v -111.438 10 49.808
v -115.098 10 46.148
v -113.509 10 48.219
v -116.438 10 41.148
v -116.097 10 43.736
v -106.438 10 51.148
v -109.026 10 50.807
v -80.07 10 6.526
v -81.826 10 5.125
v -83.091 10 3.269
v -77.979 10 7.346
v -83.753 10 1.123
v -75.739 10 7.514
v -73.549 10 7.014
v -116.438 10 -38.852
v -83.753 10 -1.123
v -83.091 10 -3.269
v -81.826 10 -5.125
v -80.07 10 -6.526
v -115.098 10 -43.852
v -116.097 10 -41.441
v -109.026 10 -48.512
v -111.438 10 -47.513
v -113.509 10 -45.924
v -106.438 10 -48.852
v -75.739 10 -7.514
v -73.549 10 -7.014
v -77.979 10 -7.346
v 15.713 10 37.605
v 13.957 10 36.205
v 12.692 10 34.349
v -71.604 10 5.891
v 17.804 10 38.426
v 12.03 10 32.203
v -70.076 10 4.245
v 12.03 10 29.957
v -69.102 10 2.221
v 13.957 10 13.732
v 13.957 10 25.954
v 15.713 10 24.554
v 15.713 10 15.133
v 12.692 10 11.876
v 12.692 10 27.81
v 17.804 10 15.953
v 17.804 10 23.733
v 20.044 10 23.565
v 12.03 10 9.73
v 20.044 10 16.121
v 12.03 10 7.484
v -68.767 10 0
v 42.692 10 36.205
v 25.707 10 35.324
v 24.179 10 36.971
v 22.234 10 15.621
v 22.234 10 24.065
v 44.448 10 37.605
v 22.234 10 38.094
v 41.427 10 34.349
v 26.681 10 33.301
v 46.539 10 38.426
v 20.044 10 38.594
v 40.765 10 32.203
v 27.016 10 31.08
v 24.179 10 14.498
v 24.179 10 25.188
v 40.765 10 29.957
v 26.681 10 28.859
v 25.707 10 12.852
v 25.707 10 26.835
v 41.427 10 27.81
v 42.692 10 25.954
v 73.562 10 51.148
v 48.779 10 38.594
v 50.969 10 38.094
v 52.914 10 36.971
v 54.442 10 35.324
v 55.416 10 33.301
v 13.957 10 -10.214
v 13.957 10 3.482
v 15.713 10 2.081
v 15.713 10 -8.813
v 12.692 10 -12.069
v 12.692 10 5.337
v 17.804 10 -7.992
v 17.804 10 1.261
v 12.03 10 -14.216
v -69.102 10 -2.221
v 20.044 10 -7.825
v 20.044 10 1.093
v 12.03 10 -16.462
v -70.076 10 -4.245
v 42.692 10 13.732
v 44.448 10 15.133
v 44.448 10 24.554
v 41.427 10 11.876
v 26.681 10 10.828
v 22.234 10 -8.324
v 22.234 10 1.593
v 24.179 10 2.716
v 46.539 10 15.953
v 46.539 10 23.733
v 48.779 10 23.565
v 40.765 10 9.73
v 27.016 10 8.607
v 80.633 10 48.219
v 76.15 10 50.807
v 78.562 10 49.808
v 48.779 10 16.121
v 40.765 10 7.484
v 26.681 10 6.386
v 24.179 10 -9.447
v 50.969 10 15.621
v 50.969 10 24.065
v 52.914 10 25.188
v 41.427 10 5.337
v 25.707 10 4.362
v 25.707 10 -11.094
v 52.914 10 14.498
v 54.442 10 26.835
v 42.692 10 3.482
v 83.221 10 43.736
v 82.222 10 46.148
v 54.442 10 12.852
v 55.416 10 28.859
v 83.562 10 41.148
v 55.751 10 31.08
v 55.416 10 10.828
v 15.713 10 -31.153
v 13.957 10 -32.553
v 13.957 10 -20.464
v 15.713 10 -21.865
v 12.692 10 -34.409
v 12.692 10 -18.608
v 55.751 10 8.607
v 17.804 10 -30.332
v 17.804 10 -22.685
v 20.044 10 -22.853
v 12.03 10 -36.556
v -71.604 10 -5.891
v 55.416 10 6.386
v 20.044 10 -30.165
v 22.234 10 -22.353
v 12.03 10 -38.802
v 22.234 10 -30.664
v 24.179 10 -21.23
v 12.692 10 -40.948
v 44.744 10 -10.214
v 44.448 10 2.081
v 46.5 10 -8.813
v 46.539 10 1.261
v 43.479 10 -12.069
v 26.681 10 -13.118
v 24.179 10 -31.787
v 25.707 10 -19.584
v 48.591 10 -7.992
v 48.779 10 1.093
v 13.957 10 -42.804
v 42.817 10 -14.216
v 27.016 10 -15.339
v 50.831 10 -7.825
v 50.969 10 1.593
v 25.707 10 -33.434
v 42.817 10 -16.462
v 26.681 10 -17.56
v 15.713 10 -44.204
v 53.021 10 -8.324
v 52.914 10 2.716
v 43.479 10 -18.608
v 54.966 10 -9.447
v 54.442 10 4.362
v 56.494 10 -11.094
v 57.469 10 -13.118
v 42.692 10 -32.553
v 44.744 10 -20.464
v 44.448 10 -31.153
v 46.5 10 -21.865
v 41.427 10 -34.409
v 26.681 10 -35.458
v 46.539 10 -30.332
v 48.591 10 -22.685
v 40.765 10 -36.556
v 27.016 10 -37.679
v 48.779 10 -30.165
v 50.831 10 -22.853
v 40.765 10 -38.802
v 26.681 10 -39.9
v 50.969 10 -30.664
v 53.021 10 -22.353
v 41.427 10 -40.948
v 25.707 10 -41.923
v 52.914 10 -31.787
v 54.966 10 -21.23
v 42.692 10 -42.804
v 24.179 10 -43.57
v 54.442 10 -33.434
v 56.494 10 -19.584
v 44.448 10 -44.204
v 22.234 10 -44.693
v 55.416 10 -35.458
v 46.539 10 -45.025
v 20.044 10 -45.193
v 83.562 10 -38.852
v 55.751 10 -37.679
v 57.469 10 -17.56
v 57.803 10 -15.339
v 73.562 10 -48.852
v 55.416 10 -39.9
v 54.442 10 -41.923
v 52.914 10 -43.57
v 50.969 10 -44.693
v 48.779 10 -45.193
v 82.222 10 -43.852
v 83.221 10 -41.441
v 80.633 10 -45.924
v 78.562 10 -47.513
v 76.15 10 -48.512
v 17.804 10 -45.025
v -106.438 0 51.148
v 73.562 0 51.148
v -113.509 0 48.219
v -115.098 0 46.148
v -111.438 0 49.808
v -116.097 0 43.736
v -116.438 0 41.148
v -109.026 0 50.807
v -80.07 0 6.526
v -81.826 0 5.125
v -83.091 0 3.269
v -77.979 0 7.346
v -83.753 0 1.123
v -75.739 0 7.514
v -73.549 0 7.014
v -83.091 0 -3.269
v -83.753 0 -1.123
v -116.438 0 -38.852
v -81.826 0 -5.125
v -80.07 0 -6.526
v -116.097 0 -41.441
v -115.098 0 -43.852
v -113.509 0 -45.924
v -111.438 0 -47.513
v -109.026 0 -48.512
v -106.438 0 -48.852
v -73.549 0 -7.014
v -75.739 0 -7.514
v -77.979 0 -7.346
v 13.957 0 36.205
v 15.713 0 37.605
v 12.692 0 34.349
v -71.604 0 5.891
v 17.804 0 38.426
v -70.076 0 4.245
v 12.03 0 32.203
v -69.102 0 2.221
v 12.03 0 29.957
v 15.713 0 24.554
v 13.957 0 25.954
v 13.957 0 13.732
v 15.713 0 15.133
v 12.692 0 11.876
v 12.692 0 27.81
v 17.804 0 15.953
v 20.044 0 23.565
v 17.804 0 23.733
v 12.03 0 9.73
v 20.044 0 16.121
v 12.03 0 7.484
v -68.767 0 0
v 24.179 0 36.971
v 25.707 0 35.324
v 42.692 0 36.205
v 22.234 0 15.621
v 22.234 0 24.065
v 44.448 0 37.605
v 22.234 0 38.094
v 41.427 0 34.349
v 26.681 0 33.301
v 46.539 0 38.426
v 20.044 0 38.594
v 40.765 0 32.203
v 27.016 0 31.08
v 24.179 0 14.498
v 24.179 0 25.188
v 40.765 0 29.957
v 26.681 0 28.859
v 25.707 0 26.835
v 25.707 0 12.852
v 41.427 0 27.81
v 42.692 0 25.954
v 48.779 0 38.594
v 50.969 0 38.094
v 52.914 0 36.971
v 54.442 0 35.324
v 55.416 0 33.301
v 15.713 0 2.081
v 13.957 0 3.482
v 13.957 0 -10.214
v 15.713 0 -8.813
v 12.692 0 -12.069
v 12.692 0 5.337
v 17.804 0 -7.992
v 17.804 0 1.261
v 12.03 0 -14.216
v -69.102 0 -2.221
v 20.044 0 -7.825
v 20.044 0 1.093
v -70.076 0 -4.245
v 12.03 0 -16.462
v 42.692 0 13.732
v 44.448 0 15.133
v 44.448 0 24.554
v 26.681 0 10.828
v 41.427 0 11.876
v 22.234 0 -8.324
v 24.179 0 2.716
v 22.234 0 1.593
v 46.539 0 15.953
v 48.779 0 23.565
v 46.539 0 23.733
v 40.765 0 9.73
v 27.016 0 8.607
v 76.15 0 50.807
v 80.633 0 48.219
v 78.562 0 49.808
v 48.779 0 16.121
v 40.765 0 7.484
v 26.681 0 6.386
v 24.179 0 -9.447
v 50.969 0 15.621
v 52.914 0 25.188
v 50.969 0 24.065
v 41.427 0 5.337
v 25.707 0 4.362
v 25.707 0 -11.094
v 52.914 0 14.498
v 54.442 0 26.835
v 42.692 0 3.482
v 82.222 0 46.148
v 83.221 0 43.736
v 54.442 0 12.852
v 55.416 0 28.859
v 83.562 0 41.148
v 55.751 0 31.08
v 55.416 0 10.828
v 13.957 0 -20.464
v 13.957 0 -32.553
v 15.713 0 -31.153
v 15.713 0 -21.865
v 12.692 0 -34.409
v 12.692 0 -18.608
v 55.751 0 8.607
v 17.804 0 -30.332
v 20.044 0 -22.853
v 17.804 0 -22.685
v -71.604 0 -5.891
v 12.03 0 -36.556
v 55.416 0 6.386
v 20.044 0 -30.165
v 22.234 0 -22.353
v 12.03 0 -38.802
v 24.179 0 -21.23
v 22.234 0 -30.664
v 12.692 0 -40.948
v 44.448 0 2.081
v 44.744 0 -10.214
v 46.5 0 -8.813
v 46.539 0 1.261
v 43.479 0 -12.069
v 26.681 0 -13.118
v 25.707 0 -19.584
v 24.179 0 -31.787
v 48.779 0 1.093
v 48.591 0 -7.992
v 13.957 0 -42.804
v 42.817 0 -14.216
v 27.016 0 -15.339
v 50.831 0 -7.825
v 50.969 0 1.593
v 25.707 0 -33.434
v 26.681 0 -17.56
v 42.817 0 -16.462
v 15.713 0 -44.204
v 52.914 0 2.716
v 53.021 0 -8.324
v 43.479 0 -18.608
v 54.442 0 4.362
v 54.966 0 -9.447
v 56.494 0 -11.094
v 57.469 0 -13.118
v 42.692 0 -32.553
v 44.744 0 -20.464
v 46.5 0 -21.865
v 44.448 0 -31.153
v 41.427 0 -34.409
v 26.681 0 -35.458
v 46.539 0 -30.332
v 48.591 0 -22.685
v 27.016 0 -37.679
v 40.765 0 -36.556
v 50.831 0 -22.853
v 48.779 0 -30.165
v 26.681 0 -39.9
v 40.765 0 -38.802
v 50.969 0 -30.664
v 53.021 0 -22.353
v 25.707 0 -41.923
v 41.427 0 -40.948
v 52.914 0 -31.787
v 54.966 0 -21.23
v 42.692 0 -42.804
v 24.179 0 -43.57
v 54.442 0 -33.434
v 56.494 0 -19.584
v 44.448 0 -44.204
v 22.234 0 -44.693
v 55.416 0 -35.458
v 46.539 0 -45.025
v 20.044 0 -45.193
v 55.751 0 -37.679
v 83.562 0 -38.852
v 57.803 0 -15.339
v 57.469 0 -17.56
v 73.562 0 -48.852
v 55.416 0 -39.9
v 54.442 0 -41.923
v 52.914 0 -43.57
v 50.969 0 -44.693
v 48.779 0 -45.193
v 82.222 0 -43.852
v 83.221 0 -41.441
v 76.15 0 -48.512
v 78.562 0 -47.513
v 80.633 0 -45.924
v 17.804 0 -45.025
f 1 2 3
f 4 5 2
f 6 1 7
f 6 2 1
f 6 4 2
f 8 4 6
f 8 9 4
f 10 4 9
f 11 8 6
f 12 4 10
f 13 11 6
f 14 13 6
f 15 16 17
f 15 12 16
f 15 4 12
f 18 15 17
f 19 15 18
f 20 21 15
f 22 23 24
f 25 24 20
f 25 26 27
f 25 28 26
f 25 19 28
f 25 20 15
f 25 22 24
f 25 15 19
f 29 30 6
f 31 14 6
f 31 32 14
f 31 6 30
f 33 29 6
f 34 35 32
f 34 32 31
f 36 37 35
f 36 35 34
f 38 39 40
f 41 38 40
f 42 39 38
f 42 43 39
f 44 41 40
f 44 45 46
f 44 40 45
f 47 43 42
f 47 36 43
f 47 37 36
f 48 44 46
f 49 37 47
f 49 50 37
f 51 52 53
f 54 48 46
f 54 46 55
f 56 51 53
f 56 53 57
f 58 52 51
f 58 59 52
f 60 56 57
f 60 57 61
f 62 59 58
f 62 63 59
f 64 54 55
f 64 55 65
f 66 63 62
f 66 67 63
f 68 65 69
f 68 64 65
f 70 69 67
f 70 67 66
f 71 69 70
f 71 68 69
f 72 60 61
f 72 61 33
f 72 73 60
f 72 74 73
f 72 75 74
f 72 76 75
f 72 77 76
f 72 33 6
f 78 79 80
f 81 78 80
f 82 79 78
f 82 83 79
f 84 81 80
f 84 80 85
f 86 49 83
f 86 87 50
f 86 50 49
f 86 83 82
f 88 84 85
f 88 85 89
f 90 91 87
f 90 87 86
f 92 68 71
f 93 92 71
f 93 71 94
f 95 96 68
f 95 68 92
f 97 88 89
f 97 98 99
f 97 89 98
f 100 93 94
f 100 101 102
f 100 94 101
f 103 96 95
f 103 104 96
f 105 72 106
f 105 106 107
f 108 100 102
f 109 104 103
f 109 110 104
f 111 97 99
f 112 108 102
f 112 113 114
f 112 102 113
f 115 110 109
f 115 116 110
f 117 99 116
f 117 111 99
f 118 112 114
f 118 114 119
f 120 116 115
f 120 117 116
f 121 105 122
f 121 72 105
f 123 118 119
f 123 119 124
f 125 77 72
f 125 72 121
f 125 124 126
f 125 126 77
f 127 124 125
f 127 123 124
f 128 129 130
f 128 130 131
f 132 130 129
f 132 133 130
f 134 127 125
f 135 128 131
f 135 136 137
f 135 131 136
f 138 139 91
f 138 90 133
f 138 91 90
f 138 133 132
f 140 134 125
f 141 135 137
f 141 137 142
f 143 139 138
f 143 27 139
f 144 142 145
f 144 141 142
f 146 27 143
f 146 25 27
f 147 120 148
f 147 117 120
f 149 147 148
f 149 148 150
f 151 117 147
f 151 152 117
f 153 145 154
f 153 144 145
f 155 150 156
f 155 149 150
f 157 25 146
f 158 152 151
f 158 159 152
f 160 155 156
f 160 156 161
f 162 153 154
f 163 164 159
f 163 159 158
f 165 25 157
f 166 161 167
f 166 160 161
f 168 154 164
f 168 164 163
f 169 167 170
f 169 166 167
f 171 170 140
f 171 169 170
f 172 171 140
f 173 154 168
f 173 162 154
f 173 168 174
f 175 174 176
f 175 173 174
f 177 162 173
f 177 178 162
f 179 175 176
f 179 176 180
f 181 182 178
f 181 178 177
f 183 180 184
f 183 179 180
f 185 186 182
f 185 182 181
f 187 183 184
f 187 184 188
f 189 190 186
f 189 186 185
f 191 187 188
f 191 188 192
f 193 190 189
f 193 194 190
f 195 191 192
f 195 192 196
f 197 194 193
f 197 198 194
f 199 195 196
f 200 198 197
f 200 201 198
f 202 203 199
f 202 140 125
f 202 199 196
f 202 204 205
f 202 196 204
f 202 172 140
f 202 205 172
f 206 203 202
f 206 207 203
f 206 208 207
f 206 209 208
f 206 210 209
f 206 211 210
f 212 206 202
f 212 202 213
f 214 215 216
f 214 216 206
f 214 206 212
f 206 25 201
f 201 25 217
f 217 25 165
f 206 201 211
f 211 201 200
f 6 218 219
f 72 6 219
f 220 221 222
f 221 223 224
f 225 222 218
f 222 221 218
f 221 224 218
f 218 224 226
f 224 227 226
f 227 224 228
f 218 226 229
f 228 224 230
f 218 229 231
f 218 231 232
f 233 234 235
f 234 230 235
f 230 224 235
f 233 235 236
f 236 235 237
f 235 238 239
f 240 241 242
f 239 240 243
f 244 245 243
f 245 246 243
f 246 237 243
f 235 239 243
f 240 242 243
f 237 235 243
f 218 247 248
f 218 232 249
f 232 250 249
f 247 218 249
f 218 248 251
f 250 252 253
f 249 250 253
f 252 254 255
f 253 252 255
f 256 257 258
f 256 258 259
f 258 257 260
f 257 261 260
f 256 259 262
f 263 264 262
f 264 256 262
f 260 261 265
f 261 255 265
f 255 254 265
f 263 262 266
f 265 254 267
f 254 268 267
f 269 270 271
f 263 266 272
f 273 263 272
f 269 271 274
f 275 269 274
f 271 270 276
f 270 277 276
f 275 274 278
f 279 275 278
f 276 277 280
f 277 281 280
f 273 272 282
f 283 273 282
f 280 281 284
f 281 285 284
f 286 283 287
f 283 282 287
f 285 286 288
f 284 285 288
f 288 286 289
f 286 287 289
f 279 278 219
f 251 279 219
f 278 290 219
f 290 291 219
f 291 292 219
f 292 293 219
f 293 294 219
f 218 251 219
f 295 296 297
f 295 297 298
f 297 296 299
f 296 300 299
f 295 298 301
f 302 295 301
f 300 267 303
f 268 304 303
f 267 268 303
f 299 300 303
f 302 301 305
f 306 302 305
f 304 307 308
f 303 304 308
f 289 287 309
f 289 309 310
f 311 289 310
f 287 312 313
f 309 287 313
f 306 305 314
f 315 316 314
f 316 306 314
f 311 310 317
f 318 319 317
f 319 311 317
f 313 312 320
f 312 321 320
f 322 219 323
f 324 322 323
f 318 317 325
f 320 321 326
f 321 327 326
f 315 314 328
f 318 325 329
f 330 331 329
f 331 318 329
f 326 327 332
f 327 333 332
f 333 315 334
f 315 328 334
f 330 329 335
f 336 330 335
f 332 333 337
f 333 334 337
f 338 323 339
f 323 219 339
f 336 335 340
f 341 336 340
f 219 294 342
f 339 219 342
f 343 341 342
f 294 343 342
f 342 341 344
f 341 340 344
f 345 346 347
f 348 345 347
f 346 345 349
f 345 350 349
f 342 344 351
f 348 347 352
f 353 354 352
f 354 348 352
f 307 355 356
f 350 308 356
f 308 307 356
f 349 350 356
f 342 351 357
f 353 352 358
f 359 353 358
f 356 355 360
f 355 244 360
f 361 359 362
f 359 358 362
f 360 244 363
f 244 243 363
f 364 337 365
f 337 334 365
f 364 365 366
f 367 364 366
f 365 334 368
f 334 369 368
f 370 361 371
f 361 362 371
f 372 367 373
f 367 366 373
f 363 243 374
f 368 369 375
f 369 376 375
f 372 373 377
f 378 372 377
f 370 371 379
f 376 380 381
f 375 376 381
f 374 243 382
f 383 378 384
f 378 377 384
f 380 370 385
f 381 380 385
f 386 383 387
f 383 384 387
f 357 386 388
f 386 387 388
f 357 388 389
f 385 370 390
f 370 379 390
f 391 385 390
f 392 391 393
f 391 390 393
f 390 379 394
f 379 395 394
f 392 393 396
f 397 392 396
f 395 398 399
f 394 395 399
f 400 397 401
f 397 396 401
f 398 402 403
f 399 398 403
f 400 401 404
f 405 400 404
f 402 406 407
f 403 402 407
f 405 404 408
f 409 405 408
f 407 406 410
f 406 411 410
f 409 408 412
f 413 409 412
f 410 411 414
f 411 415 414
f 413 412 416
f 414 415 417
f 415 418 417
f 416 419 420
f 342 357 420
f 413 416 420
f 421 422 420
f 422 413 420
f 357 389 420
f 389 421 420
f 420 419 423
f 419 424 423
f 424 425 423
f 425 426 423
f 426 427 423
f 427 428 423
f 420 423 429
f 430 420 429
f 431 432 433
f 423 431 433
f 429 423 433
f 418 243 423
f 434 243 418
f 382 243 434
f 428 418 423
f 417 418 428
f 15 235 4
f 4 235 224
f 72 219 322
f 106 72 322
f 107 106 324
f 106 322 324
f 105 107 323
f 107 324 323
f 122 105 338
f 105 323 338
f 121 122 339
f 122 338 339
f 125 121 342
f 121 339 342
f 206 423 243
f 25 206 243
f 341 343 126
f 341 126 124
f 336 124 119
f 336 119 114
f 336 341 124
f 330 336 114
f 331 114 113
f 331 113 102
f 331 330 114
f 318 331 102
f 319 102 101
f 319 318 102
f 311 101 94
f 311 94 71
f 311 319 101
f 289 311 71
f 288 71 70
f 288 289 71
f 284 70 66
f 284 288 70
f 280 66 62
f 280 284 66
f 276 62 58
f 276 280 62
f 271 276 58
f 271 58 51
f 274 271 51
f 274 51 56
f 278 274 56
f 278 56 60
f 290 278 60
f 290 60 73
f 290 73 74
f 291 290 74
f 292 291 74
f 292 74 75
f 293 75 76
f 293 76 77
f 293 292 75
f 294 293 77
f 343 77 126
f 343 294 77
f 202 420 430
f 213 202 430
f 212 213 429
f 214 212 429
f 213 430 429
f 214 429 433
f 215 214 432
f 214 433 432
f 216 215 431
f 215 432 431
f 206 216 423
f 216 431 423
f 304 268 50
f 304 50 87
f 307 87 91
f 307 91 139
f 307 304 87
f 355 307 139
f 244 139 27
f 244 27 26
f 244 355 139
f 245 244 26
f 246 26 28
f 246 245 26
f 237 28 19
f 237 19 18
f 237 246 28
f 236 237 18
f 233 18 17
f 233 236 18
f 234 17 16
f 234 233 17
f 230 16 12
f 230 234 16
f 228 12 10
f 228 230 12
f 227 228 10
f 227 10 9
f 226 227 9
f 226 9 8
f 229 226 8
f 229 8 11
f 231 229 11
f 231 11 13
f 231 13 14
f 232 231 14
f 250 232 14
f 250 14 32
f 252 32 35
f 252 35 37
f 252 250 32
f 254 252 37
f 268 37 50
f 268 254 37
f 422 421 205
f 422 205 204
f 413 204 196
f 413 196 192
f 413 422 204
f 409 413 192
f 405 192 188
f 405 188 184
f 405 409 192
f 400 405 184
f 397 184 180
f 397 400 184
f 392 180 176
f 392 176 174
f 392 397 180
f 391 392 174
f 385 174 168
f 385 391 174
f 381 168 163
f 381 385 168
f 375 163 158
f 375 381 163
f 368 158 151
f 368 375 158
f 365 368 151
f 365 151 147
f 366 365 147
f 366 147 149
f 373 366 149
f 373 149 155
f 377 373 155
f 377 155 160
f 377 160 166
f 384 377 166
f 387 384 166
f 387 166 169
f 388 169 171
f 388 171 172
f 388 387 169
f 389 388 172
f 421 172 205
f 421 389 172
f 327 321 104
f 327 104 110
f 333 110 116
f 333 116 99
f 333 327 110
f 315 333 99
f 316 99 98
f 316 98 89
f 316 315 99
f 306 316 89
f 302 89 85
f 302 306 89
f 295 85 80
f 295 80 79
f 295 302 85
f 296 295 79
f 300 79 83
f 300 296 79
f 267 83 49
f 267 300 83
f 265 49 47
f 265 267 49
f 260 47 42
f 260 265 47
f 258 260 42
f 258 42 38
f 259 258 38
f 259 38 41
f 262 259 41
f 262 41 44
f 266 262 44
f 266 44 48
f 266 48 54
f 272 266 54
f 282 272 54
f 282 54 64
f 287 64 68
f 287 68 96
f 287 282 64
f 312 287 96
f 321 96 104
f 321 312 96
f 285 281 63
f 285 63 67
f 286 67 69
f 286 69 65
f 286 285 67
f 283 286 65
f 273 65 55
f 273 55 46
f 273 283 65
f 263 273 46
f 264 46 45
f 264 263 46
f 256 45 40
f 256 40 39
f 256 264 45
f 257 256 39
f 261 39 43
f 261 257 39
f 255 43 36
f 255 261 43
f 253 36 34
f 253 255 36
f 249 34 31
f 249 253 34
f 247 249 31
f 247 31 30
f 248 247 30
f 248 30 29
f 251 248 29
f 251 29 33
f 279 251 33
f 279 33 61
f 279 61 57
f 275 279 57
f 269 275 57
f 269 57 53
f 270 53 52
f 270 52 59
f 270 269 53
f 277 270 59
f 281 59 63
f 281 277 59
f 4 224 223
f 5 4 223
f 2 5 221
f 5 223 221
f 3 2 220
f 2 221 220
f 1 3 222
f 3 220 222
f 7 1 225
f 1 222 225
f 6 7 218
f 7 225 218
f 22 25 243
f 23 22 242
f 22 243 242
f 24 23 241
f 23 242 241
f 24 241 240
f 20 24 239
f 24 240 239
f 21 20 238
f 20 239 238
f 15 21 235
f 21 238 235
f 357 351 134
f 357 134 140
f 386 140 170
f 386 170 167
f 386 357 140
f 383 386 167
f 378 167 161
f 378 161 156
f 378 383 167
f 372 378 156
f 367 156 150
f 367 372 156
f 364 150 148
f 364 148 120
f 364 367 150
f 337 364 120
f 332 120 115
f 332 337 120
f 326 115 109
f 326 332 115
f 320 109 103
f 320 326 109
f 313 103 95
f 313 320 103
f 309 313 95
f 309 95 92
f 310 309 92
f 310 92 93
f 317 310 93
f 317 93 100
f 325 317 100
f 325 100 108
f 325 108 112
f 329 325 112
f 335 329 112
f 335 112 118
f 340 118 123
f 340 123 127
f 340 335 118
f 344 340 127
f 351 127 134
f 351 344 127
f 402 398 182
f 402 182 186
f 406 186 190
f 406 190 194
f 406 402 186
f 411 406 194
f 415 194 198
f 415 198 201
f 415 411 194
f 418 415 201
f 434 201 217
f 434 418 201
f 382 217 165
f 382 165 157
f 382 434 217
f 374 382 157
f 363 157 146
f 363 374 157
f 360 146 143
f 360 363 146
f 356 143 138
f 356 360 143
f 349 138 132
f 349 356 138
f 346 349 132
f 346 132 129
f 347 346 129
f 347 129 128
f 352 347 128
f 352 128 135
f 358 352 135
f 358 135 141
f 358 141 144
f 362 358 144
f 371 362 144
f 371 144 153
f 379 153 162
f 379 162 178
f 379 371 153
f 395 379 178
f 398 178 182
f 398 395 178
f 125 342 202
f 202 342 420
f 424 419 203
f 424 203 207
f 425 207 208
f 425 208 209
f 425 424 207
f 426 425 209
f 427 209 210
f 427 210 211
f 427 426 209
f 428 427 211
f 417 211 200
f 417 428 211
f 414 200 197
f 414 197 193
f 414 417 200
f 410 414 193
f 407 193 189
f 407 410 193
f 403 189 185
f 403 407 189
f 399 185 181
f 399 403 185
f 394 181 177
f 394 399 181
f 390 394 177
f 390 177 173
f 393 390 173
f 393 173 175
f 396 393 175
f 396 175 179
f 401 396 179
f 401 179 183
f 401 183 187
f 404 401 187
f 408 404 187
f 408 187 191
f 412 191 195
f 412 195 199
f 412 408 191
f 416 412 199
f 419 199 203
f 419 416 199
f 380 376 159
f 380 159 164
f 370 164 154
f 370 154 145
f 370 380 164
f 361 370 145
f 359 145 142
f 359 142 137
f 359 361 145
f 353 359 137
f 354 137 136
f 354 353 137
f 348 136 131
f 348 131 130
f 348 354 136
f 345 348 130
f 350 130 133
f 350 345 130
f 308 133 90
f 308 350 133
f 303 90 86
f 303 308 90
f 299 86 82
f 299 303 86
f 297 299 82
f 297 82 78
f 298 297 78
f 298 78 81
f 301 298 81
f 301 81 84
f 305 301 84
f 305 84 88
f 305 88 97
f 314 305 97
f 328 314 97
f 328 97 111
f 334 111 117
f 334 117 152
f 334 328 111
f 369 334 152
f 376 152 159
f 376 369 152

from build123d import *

# Parameters (mm, degrees)
BOSS_EXTRUDE1_DEPTH = 10
SKETCH3_R           = 7.535275438
CUT_EXTRUDE10_DEPTH = 10


with BuildPart() as part:
    # Sketch1 → Boss-Extrude1 (new body)
    with BuildSketch(Plane(origin=(0, 0, 0), x_dir=(1, 0, 0), z_dir=(0, 1, 0))):
        with BuildLine():
            Line((73.562221188, 48.852459016), (-106.437778812, 48.852459016))
            ThreePointArc((-106.437778812, 48.852459016), (-113.508846624, 45.923526828), (-116.437778812, 38.852459016))
            Line((-116.437778812, 38.852459016), (-116.437778812, -41.147540984))
            ThreePointArc((-116.437778812, -41.147540984), (-113.508846624, -48.218608795), (-106.437778812, -51.147540984))
            Line((-106.437778812, -51.147540984), (73.562221188, -51.147540984))
            ThreePointArc((73.562221188, -51.147540984), (80.633289, -48.218608795), (83.562221188, -41.147540984))
            Line((83.562221188, -41.147540984), (83.562221188, 38.852459016))
            ThreePointArc((83.562221188, 38.852459016), (80.633289, 45.923526828), (73.562221188, 48.852459016))
        make_face()
    extrude(amount=BOSS_EXTRUDE1_DEPTH)

    # Sketch3 → Cut-Extrude10 (cut)
    with BuildSketch(Plane(origin=(0, 0, 0), x_dir=(1, 0, 0), z_dir=(0, 1, 0))):
        with Locations((48.215632939, 37.678714221)):
            Circle(SKETCH3_R)
        with Locations((19.480783272, 37.678714221)):
            Circle(SKETCH3_R)
        with Locations((48.215632939, -31.079676053)):
            Circle(SKETCH3_R)
        with Locations((19.480783272, -31.079676053)):
            Circle(SKETCH3_R)
        with Locations((-76.302048951, 0)):
            Circle(SKETCH3_R)
        with Locations((19.480783272, -8.606914665)):
            Circle(SKETCH3_R)
        with Locations((48.215632939, -8.606914665)):
            Circle(SKETCH3_R)
        with Locations((19.480783272, 15.338793391)):
            Circle(SKETCH3_R)
        with Locations((50.268122201, 15.338793391)):
            Circle(SKETCH3_R)
    extrude(amount=CUT_EXTRUDE10_DEPTH, mode=Mode.SUBTRACT)


solid = part.part
